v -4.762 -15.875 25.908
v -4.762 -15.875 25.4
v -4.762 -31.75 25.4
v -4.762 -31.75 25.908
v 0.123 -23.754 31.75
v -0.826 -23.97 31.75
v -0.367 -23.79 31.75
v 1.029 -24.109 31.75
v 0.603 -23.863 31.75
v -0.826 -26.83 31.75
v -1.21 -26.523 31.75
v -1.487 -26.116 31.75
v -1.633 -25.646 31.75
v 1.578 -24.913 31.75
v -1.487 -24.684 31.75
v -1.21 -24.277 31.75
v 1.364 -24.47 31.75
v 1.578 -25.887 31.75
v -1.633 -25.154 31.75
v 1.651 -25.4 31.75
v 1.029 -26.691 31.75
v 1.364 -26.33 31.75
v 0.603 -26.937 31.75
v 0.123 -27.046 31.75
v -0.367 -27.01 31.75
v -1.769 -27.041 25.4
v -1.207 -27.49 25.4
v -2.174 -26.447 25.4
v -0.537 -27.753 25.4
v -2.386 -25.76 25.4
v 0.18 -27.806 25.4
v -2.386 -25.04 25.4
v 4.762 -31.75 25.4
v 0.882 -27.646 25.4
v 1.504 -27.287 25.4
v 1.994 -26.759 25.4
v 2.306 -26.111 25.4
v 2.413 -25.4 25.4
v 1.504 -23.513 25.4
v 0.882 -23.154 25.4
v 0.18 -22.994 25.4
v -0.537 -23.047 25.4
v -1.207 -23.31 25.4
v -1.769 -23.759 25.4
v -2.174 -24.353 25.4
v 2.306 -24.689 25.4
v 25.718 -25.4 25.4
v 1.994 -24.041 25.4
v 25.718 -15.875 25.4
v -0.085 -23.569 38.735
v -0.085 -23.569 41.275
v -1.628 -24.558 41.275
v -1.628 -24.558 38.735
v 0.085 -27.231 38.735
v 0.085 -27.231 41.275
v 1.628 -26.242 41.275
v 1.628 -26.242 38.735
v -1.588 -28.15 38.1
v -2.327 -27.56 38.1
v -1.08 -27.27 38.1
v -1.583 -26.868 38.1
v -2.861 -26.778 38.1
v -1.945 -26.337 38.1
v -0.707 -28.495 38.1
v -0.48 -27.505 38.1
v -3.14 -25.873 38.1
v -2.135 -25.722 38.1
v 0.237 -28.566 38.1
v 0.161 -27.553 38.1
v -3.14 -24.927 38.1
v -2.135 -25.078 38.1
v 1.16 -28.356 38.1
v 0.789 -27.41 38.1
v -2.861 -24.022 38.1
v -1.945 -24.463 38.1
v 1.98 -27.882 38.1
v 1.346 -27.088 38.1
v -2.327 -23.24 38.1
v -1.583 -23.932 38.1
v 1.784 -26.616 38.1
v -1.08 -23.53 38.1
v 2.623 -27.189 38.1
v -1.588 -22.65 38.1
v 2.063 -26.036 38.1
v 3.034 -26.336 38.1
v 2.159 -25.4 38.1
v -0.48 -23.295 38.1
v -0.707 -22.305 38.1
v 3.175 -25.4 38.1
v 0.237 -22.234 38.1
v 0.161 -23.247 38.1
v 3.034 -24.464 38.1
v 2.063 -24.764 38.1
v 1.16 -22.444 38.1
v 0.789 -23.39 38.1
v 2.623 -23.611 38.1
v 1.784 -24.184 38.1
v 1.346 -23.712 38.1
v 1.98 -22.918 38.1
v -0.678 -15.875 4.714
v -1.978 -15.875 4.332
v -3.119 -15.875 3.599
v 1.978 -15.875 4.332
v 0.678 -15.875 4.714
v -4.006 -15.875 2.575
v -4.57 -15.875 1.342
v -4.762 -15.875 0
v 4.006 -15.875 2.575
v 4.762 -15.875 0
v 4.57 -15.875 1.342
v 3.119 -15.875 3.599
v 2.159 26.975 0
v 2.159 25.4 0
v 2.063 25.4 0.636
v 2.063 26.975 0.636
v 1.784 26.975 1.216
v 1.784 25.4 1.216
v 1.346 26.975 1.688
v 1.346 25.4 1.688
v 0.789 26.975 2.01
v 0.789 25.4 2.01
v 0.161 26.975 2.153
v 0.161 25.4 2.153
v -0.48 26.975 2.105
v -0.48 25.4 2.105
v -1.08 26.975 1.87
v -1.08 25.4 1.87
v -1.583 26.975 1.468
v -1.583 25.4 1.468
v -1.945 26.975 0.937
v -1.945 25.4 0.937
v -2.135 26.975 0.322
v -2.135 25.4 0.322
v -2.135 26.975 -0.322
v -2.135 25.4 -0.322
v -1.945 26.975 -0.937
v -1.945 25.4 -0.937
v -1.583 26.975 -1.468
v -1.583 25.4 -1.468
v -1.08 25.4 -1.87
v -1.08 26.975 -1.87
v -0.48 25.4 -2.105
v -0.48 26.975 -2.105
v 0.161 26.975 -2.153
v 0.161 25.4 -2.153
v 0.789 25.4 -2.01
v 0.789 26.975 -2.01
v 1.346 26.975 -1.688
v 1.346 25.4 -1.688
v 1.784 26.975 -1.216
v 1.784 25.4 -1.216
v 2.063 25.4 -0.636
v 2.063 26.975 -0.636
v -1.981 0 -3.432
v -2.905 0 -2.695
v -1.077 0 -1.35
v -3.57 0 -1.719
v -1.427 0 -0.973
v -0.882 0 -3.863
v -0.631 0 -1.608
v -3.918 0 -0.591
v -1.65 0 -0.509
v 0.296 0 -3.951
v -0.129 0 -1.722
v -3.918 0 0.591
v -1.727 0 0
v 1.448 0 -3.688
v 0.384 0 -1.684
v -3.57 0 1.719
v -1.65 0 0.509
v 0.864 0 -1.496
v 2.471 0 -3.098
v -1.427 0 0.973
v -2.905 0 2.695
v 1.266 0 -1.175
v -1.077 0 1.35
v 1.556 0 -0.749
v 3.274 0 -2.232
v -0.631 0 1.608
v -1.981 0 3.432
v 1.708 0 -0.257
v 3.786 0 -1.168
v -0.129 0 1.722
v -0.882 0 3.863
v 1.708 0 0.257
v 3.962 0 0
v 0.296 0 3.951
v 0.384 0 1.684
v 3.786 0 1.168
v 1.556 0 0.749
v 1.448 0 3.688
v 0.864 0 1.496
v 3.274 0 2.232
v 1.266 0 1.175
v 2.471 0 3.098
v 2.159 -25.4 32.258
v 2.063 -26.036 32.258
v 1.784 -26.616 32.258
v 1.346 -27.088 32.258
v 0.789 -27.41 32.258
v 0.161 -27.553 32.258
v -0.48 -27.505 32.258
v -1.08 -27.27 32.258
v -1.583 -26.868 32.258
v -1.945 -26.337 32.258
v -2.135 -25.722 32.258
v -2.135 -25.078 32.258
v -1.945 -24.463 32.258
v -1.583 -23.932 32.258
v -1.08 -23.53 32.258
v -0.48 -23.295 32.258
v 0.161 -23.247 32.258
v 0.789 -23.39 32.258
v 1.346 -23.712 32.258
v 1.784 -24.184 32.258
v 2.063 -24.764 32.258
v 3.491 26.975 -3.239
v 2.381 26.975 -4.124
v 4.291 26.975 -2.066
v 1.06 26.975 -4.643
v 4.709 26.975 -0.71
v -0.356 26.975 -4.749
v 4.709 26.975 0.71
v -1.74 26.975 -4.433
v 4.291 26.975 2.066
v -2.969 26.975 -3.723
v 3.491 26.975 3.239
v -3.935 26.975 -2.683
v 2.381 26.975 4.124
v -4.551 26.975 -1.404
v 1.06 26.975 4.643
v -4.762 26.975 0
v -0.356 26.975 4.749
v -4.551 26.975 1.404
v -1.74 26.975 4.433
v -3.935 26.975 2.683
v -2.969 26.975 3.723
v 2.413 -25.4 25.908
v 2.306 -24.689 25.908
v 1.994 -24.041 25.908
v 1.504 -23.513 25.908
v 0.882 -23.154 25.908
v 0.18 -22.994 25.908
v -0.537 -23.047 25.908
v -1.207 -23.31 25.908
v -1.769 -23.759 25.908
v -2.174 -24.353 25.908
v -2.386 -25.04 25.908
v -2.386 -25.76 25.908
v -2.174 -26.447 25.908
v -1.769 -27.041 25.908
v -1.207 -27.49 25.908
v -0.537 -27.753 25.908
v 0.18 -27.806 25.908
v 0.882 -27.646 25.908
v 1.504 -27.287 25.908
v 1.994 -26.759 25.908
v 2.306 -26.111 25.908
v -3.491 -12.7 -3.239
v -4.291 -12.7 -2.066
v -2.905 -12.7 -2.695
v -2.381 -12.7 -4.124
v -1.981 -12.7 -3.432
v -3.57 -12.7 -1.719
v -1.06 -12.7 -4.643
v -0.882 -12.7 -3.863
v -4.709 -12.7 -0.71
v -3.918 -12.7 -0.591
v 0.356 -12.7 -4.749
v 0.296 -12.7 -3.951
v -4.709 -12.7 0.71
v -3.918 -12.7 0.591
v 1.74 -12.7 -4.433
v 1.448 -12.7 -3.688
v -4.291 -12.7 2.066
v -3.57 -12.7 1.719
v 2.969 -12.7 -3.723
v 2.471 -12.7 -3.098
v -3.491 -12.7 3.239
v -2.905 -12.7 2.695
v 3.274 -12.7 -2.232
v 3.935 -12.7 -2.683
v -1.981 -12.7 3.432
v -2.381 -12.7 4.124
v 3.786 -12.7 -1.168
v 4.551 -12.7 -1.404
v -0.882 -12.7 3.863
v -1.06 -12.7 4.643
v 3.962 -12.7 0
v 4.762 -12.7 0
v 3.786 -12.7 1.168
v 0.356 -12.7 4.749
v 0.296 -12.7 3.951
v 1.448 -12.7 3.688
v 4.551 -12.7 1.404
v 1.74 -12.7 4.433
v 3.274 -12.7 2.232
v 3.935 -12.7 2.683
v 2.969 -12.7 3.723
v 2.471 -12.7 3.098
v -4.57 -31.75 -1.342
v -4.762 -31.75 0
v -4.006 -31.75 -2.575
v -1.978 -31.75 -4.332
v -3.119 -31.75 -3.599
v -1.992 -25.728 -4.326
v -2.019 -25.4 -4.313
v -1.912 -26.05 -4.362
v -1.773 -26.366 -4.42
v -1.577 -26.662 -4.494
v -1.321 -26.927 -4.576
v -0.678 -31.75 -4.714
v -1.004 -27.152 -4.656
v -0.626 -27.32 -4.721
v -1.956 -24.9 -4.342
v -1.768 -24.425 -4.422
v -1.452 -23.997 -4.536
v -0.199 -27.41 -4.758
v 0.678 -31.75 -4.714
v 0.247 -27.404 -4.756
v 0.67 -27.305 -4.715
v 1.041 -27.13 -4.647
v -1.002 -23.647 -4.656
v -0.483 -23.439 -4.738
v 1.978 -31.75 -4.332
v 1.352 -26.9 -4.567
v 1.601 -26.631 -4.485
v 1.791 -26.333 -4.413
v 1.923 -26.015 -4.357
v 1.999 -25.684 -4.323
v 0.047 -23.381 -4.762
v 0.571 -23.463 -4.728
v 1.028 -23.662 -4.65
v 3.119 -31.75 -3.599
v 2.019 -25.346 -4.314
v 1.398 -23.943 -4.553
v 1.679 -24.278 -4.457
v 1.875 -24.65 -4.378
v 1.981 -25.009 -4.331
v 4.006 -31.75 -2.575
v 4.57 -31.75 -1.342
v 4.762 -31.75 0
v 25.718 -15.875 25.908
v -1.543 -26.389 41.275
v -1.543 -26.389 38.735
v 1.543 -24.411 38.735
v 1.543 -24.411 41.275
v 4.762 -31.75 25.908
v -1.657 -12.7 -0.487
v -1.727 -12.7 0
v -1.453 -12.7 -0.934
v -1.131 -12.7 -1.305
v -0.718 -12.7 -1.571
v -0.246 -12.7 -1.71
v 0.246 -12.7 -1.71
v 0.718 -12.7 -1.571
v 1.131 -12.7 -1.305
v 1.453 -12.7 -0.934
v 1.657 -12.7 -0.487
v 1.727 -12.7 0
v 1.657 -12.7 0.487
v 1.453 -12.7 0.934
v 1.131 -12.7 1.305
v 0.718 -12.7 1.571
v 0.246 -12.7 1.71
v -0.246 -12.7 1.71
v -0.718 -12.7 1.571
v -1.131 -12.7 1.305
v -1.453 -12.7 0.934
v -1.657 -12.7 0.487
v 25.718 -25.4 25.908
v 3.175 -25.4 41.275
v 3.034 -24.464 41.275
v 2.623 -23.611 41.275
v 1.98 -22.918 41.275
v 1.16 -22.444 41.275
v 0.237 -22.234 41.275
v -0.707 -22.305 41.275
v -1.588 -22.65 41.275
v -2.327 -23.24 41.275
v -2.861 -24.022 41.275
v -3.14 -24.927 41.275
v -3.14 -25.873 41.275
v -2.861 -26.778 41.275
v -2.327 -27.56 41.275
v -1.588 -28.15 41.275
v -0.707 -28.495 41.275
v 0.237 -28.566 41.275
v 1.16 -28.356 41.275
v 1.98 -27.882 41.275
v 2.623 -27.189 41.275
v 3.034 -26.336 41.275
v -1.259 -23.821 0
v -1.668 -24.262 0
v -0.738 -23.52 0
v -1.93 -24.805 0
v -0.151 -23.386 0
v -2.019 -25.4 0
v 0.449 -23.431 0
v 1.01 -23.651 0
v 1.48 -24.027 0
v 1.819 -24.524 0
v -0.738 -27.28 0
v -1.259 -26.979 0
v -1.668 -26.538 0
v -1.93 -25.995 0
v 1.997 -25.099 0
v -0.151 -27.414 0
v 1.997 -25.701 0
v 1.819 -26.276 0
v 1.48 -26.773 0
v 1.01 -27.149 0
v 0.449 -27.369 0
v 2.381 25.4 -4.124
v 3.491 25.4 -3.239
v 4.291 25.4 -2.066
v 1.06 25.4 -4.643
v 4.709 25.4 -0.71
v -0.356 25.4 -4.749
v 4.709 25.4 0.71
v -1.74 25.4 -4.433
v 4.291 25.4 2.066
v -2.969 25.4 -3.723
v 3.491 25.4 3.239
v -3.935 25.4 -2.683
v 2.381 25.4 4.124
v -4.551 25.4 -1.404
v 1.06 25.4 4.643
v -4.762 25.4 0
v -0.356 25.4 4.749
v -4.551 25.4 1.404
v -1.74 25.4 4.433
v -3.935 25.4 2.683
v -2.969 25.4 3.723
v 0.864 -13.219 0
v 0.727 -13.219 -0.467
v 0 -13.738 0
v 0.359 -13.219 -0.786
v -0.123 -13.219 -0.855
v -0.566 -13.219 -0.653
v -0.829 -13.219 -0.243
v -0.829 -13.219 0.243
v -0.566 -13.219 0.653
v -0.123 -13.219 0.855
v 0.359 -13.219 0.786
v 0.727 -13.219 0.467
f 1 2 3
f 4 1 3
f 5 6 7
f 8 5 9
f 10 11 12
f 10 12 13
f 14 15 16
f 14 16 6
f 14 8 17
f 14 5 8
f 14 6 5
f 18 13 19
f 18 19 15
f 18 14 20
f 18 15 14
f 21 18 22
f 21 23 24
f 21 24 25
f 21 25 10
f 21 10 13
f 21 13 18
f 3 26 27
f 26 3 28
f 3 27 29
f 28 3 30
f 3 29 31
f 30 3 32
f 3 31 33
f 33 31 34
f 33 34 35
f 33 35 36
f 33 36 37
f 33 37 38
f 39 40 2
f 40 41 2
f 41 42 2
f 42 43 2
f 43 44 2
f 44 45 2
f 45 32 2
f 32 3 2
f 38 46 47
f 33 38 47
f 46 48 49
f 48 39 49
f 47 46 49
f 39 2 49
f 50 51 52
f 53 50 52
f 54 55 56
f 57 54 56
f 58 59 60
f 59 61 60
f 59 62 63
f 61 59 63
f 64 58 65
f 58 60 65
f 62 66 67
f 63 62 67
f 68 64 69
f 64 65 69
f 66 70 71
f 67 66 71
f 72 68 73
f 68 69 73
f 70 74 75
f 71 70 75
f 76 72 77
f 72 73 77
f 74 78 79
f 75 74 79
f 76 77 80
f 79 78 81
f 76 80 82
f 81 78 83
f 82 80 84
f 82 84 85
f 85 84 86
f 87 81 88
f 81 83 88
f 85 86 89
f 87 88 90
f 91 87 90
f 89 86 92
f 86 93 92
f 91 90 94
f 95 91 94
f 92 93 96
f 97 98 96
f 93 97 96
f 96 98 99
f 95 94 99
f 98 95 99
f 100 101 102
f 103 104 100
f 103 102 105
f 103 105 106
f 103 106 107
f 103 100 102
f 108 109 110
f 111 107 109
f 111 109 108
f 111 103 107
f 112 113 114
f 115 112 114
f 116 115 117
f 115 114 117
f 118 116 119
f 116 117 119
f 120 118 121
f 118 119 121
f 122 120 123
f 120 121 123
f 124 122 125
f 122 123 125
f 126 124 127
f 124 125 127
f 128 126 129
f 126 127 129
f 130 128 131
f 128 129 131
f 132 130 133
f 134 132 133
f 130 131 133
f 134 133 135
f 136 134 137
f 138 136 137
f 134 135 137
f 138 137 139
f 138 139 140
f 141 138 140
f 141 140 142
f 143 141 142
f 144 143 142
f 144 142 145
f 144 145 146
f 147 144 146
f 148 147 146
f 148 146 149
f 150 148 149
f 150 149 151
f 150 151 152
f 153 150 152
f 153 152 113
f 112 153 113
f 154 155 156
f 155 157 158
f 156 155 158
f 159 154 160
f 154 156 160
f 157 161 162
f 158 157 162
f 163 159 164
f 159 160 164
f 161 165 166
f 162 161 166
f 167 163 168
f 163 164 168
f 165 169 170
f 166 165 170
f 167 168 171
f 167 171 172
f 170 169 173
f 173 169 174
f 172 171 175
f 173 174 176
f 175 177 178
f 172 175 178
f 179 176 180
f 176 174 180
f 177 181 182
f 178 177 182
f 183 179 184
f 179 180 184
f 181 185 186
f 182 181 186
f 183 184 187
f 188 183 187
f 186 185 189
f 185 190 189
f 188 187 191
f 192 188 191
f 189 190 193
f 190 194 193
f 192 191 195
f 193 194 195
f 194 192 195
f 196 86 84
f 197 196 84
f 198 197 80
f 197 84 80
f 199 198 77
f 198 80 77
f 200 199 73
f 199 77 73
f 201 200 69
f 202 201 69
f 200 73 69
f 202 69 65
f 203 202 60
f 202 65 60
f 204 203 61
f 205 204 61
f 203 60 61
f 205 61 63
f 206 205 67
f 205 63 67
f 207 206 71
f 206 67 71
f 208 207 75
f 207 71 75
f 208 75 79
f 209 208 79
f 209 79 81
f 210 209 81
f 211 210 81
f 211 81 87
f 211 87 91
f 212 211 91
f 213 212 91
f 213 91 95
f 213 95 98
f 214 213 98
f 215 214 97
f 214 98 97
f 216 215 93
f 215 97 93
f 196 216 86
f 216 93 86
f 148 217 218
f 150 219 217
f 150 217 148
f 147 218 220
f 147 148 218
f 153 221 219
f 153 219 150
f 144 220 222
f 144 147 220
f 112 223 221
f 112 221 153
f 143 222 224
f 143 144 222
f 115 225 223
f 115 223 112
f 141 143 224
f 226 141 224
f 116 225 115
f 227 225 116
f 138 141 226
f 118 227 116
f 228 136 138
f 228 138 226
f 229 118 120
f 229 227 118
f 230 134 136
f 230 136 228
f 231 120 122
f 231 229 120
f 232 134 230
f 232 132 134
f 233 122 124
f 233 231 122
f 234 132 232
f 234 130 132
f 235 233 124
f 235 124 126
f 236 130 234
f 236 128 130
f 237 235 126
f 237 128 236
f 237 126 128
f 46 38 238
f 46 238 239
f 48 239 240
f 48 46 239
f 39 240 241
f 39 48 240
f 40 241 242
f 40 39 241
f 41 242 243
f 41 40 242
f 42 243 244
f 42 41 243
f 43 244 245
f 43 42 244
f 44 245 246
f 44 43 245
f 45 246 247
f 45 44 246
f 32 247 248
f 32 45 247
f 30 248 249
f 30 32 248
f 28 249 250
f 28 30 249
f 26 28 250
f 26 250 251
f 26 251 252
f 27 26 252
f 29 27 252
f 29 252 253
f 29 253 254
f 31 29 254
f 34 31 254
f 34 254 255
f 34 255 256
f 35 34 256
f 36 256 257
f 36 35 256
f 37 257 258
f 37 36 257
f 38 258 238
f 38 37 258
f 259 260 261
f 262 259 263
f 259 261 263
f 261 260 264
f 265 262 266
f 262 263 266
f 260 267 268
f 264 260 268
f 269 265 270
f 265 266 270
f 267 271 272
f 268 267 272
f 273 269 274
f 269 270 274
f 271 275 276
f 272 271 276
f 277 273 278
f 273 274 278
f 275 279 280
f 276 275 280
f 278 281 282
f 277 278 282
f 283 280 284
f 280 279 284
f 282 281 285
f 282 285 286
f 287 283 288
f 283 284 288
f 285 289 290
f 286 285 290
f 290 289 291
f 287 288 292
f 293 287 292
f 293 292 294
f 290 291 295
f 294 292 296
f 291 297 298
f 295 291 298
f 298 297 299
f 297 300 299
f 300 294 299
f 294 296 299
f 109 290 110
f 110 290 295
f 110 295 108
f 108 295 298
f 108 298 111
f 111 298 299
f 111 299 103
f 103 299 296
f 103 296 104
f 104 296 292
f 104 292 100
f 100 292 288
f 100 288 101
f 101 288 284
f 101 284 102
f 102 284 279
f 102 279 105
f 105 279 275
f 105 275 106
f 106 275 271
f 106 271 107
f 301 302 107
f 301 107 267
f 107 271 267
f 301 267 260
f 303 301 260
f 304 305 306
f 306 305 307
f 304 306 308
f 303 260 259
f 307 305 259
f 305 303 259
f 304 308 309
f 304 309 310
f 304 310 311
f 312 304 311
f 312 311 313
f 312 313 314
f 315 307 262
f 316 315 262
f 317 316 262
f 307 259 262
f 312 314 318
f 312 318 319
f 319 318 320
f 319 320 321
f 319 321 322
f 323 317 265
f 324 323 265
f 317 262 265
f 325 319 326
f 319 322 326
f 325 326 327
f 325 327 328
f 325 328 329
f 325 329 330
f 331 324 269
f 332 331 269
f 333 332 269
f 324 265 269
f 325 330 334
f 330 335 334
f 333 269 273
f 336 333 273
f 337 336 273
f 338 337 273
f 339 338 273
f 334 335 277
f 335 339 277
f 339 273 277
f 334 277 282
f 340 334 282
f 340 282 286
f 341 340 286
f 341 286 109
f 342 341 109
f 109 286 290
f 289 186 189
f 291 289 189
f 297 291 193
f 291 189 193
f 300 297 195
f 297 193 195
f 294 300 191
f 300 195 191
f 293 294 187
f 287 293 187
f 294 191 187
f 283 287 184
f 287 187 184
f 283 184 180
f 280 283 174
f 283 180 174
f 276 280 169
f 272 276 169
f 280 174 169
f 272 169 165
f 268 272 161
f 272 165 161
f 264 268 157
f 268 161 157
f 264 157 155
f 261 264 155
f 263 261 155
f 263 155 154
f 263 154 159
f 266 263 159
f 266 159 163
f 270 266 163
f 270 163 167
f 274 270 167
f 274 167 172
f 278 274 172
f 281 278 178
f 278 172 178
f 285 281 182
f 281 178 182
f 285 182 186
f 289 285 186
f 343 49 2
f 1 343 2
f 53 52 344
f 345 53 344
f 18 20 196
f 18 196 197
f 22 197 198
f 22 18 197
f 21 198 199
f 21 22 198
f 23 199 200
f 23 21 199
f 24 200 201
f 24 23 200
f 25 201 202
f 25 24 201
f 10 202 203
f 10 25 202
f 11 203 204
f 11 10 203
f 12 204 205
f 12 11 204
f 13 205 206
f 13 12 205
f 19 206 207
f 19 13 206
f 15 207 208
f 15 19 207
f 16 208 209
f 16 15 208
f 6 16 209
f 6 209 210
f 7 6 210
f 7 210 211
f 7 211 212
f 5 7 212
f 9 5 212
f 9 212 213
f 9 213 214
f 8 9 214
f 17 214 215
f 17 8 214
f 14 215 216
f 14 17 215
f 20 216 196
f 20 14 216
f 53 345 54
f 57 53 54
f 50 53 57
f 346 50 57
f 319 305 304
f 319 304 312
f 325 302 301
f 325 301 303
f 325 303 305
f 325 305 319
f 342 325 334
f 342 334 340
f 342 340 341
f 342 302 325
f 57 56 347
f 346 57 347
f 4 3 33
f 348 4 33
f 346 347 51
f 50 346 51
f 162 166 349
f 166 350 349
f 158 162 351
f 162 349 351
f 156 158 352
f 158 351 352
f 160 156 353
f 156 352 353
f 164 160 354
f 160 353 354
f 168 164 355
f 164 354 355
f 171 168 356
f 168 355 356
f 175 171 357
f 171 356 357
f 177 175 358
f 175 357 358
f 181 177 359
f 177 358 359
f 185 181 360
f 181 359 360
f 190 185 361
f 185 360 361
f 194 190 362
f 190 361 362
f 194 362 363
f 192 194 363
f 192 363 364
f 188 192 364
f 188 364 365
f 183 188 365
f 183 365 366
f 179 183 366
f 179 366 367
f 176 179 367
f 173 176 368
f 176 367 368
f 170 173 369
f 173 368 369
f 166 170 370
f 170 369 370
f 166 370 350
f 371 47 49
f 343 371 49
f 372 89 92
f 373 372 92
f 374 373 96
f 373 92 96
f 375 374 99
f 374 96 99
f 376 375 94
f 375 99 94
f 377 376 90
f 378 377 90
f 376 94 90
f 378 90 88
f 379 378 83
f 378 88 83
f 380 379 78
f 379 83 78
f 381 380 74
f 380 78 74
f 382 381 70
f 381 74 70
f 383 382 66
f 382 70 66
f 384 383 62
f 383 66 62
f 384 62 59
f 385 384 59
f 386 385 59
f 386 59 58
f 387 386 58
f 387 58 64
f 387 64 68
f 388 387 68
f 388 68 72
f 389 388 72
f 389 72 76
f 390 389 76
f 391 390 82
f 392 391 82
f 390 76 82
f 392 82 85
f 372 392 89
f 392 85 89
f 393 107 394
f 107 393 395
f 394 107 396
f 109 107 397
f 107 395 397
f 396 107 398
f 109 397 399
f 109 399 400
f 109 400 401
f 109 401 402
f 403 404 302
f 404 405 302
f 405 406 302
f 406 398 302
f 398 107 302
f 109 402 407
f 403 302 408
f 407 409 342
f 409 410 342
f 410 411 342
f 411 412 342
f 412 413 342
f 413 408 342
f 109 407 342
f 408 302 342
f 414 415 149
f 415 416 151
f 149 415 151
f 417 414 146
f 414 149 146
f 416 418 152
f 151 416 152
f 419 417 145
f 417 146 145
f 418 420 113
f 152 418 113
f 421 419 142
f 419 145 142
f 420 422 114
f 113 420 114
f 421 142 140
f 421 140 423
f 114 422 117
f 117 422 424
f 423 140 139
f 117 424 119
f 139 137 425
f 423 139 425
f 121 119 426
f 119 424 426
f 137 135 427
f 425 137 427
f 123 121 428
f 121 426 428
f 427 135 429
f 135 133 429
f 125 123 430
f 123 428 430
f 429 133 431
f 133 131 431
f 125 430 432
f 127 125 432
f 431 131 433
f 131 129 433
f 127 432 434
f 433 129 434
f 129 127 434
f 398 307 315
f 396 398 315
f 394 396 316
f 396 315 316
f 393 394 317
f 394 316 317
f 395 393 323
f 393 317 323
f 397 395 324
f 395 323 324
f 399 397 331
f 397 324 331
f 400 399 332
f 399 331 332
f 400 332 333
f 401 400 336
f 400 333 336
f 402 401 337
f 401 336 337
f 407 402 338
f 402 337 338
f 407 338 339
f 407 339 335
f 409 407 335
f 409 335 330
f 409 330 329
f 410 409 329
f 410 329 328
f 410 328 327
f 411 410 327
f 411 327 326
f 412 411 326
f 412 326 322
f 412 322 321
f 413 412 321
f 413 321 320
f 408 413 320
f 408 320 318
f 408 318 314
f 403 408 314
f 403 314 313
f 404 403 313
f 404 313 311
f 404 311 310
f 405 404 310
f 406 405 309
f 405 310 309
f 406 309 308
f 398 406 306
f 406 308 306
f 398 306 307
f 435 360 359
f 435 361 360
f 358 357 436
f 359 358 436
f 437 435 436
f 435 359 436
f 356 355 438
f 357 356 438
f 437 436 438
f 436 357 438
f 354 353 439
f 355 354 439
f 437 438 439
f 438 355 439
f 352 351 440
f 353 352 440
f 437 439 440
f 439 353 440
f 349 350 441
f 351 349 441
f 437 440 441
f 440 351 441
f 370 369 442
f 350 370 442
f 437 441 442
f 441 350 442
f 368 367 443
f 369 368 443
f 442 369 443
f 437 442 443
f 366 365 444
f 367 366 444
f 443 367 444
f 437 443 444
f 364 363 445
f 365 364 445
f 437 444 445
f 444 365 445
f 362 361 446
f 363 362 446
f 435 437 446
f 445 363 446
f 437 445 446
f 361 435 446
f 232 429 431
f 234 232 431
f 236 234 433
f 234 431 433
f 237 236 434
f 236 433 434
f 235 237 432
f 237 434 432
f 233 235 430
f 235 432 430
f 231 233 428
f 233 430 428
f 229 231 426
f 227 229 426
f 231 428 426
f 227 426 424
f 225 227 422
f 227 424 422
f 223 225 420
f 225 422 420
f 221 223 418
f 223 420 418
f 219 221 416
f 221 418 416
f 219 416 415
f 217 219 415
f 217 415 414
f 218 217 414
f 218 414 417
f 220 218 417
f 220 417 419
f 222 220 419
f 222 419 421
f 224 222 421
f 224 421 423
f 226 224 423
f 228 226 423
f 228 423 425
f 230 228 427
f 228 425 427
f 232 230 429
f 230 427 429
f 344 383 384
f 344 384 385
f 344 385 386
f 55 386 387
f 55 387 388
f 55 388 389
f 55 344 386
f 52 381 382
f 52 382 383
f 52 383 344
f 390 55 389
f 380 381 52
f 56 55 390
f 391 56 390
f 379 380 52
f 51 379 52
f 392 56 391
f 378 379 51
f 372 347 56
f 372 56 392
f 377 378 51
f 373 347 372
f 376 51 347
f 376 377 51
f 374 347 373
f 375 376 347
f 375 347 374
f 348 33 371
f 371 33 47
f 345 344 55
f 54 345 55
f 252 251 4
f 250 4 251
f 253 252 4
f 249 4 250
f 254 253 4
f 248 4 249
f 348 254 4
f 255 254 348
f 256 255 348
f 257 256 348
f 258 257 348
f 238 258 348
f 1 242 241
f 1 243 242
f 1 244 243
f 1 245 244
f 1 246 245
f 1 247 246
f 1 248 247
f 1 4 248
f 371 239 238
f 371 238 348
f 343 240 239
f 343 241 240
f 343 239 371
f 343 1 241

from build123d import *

# Parameters (mm, degrees)
F0_R      = 3.9624
F1_DEPTH  = 12.7
F2_R      = 4.7625
F2_R_2    = 3.9624
F3_DEPTH  = 19.05
F5_D      = 3.4544
F5_DEPTH  = 12.7
F5_TIP    = 1.0378064612
F7_DEPTH  = 15.875
F9_D      = 4.0386
F11_R     = 2.413
F12_DEPTH = 0.508
F14_R     = 4.7625
F15_DEPTH = 1.5748
F17_D     = 4.318
F19_R     = 3.175
F20_DEPTH = 3.175
F22_DEPTH = 2.54
F23_R     = 2.159
F24_DEPTH = 6.35
F25_SIZE  = 0.508


with BuildPart() as f1:
    # F0 (on Front) → F1 (new body)
    with BuildSketch(Plane.XZ):
        Circle(F0_R)
    extrude(amount=F1_DEPTH)

    # F2 (on face) → F3 (join)
    with BuildSketch(Plane.XZ.offset(12.7)):
        Circle(F2_R)
        Circle(F2_R_2, mode=Mode.SUBTRACT)
        Circle(F2_R_2)
    extrude(amount=F3_DEPTH)

    # F5
    with Locations(Plane(origin=(0, 0, 0), x_dir=(1, 0, 0), z_dir=(0, 1, 0))):
        with Locations((0, 0)):
            Hole(F5_D / 2, depth=F5_DEPTH)
            with Locations((0, 0, -(F5_DEPTH + F5_TIP / 2))):  # 118° drill point
                Cone(0, F5_D / 2, F5_TIP, mode=Mode.SUBTRACT)

    # F6 (on face) → F7 (cut)
    with BuildSketch(Plane.XZ.offset(31.75)):
        with BuildLine():
            Line((-4.7625, 0), (4.7625, 0))
            ThreePointArc((4.7625, 0), (0, 4.7625), (-4.7625, 0))
        make_face()
    extrude(amount=-F7_DEPTH, mode=Mode.SUBTRACT)

    # F9 (through all)
    with Locations(Plane.XY):
        with Locations((0, -25.4)):
            Hole(F9_D / 2)


with BuildPart() as f12:
    # F11 (on offset) → F12 (new body)
    with BuildSketch(Plane.XY.offset(25.4)):
        Polygon((25.7175, -15.875), (-4.7625, -15.875), (-4.7625, -31.75), (4.7625, -31.75), (25.7175, -25.4), align=None)
        with Locations((0, -25.4)):
            Circle(F11_R, mode=Mode.SUBTRACT)
    extrude(amount=F12_DEPTH)


with BuildPart() as f15:
    # F14 (on offset) → F15 (new body)
    with BuildSketch(Plane(origin=(0, 25.4, 0), x_dir=(-1, 0, 0), z_dir=(0, 1, 0))):
        Circle(F14_R)
    extrude(amount=F15_DEPTH)

    # F17 (through all)
    with Locations(Plane(origin=(0, 26.9748, 0), x_dir=(-1, 0, 0), z_dir=(0, 1, 0))):
        with Locations((0, 0)):
            Hole(F17_D / 2)


with BuildPart() as f20:
    # F19 (on offset) → F20 (new body)
    with BuildSketch(Plane.XY.offset(38.1)):
        with Locations((0, -25.4)):
            Circle(F19_R)
    extrude(amount=F20_DEPTH)

    # F21 (on face) → F22 (cut)
    with BuildSketch(Plane.XY.offset(41.275)):
        Polygon((-1.5431975512, -26.3893177707), (0.0851755462, -27.2311071677), (1.6283730974, -26.241789397), (1.5431975512, -24.4106822293), (-0.0851755462, -23.5688928323), (-1.6283730974, -24.558210603), align=None)
    extrude(amount=-F22_DEPTH, mode=Mode.SUBTRACT)

    # F23 (on face) → F24 (join)
    with BuildSketch(Plane(origin=(0, 0, 38.1), x_dir=(1, 0, 0), z_dir=(0, 0, -1))):
        with Locations((0, 25.4)):
            Circle(F23_R)
    extrude(amount=F24_DEPTH)

    # F25
    f25_edges = [f20.edges().sort_by_distance(p)[0] for p in [
        (-2.159, -25.4, 31.75),
    ]]
    chamfer(f25_edges, length=F25_SIZE)


solid = Compound([f1.part, f12.part, f15.part, f20.part])
